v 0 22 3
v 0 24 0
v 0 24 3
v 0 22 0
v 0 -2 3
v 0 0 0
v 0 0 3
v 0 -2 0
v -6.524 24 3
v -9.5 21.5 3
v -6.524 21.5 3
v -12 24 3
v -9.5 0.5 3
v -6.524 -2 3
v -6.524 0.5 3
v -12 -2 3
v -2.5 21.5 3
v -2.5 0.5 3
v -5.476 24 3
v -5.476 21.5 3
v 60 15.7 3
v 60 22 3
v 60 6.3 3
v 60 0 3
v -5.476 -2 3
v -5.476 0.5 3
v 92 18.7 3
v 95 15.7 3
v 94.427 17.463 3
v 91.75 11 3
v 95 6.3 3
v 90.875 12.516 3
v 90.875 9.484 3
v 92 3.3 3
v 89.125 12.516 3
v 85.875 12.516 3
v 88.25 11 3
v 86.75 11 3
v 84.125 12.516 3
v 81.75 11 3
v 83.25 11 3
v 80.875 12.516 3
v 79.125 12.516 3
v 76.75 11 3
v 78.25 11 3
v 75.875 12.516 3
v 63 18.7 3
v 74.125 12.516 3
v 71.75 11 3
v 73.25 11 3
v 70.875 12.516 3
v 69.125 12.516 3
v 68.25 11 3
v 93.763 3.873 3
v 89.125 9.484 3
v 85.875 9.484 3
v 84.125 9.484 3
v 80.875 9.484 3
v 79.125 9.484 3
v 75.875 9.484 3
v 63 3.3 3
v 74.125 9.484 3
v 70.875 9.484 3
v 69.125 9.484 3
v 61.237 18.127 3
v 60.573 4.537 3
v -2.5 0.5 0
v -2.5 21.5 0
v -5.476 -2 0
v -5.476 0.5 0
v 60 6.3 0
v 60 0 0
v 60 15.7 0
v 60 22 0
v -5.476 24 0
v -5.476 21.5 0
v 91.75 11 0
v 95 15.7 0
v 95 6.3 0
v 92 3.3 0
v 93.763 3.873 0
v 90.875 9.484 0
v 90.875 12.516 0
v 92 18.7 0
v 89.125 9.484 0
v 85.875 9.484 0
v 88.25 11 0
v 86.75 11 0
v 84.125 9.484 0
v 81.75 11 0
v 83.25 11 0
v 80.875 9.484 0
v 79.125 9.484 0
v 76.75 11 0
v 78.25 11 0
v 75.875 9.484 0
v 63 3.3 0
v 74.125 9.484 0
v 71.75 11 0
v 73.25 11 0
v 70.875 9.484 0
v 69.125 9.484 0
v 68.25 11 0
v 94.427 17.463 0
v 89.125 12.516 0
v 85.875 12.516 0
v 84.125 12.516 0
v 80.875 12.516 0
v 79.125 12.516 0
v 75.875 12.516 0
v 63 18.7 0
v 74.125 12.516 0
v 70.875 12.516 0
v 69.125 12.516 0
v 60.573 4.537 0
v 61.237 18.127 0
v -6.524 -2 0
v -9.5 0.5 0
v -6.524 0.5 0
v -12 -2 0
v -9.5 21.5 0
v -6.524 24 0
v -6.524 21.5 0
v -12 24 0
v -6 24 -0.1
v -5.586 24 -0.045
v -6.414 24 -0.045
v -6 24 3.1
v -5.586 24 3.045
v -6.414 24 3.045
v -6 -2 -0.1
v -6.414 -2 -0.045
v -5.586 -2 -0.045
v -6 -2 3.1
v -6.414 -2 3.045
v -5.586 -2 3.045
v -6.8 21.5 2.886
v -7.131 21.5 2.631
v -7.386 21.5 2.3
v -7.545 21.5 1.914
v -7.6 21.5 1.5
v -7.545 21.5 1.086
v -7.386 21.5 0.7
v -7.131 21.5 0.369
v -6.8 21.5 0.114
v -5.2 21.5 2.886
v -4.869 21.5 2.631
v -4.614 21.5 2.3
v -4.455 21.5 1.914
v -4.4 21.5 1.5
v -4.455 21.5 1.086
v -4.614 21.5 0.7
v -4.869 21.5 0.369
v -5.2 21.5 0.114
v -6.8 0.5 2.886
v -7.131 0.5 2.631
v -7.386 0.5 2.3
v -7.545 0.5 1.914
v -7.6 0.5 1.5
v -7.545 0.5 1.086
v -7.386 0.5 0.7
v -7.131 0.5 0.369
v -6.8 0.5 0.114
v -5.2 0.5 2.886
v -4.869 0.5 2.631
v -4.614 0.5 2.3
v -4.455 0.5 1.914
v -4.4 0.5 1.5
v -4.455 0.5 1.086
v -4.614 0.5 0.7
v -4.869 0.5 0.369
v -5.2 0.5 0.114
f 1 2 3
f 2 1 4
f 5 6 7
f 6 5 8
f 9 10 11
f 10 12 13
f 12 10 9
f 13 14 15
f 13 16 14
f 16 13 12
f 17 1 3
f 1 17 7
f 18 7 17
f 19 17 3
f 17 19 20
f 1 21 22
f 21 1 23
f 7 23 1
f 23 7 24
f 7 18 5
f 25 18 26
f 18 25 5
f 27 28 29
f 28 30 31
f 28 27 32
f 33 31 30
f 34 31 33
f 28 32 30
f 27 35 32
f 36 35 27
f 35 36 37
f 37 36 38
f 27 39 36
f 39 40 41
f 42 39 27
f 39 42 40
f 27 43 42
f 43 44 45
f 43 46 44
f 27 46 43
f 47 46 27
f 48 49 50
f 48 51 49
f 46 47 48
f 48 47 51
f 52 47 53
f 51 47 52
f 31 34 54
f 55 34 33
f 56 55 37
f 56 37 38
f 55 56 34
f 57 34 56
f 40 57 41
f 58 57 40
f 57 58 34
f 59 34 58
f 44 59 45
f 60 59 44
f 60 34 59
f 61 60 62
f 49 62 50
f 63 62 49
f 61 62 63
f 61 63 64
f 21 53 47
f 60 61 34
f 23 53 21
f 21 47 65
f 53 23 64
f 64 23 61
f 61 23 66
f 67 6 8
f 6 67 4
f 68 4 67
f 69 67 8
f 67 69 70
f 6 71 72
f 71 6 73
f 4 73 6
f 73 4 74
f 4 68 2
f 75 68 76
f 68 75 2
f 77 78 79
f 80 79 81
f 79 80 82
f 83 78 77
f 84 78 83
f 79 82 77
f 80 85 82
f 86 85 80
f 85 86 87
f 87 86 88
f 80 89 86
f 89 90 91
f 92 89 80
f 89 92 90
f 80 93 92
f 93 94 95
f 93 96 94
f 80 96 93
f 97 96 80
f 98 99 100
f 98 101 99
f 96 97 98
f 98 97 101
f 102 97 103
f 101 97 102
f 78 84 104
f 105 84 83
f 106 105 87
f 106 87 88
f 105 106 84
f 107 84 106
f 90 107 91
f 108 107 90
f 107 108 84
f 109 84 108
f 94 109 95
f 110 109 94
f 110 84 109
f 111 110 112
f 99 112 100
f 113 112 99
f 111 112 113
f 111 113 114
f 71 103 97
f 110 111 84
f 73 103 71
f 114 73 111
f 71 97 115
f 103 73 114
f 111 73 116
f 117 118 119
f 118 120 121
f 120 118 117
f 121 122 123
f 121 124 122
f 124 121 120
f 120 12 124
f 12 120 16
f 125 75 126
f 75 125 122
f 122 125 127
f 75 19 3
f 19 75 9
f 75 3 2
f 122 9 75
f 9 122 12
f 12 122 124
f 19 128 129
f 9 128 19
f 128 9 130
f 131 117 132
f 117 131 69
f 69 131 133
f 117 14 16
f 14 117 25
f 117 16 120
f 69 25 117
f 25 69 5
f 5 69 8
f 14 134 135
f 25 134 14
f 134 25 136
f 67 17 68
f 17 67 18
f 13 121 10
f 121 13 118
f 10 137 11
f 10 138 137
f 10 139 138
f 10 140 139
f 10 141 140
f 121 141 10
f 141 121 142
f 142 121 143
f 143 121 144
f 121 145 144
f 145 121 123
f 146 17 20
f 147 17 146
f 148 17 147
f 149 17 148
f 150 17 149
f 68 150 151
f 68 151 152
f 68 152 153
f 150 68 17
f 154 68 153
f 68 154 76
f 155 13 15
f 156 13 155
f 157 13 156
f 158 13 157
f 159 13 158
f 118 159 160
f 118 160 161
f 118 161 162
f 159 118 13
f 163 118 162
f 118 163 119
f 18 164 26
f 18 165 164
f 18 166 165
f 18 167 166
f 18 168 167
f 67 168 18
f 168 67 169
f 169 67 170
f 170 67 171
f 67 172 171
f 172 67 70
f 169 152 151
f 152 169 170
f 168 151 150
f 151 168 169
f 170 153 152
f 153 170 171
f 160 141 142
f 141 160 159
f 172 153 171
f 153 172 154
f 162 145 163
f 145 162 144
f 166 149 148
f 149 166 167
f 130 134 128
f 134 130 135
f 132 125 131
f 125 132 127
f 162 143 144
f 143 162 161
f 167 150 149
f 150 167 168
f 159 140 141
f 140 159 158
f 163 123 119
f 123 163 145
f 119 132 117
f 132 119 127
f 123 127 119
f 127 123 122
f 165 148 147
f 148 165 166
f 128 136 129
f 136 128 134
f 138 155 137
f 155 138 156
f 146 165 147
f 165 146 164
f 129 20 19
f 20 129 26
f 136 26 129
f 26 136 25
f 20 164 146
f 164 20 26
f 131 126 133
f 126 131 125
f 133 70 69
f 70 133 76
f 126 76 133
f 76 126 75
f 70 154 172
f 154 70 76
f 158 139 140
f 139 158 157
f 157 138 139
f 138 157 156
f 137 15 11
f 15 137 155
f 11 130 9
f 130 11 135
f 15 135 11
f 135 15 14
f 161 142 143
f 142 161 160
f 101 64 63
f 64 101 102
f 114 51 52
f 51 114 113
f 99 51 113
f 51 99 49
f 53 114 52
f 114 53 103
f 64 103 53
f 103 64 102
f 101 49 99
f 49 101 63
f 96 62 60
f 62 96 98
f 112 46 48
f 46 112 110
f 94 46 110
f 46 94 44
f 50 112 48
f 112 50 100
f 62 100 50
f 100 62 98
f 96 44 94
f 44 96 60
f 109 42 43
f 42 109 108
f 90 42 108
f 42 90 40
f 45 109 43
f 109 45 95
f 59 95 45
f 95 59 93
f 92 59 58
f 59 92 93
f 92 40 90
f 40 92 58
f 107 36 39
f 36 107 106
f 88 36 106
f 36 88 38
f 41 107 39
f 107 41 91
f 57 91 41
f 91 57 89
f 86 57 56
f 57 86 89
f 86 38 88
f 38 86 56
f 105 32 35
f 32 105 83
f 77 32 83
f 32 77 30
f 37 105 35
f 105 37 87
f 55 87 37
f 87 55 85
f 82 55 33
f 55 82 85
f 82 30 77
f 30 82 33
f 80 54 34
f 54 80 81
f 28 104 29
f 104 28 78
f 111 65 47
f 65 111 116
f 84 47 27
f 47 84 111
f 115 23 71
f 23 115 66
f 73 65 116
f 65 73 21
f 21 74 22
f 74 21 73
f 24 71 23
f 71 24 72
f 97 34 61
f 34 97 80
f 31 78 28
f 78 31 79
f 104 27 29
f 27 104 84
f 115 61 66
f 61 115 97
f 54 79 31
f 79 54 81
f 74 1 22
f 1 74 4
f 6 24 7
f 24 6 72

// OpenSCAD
// latches/buckle.scad — pin-through-hole buckle, leather-bracelet authentic.
// MIT licensed.
//
// One end gets the frame + pin; the other end gets a tongue with a row of
// holes. Caller invokes once at each end with end="left" or end="right".
//
// LEARNING-MODE NOTE: hole count and spacing is a UX call. Defaults below
// give 5 holes at 5 mm spacing => 20 mm of size adjustability. Goth subculture
// tends to want fewer, wider holes; festival use wants more, tighter holes.
// To tune, change BUCKLE_HOLES and BUCKLE_HOLE_SPACING. If you change them,
// also update src/open_studs/params.py to match (drift test will fail
// otherwise once Push 2 lands).

BUCKLE_HOLES         = 5;     // count of adjustment holes
BUCKLE_HOLE_SPACING  = 5;     // mm center-to-center
BUCKLE_HOLE_DIAMETER = 3.5;   // mm — sized to the printed pin
BUCKLE_PIN_DIAMETER  = 3.2;   // mm — slightly under hole for friction
BUCKLE_FRAME_LENGTH  = 12;    // mm — length of the buckle frame
BUCKLE_TONGUE_LENGTH = 35;    // mm — length of the tongue past the band

module latch_buckle(band_width, band_thickness, end = "both") {
    if (end == "left" || end == "both")  buckle_frame(band_width, band_thickness);
    if (end == "right" || end == "both") buckle_tongue(band_width, band_thickness);
}

module buckle_frame(band_width, band_thickness) {
    // a rectangular frame sitting at x=0, extending into -X by BUCKLE_FRAME_LENGTH.
    // pin runs across in Y.
    frame_w = band_width + 4;
    frame_l = BUCKLE_FRAME_LENGTH;
    wall    = 2.5;
    bar_d   = BUCKLE_PIN_DIAMETER;

    translate([-frame_l, -2, 0]) {
        difference() {
            // outer block
            cube([frame_l, frame_w, band_thickness]);
            // inner cutout
            translate([wall, wall, -0.1])
                cube([frame_l - 2 * wall, frame_w - 2 * wall, band_thickness + 0.2]);
        }
        // pin bar across the middle
        translate([frame_l / 2, 0, band_thickness / 2])
            rotate([-90, 0, 0])
                cylinder(h = frame_w, d = bar_d, $fn = 24);
    }
}

module buckle_tongue(band_width, band_thickness) {
    // a tongue at x=0 (right end of band) extending +X by BUCKLE_TONGUE_LENGTH,
    // with BUCKLE_HOLES holes punched through.
    tongue_w = band_width * 0.7;
    tongue_l = BUCKLE_TONGUE_LENGTH;

    difference() {
        translate([0, (band_width - tongue_w) / 2, 0])
            linear_extrude(height = band_thickness)
                offset(r = 3) offset(delta = -3)
                    square([tongue_l, tongue_w]);

        // adjustment holes, centered on the tongue, spaced from the band end
        hole_start = 10;
        for (i = [0 : BUCKLE_HOLES - 1])
            translate([hole_start + i * BUCKLE_HOLE_SPACING, band_width / 2, -0.1])
                cylinder(h = band_thickness + 0.2, d = BUCKLE_HOLE_DIAMETER);
    }
}

// development render — show the frame end on a stub of band so you can see
// how it sits.
*latch_buckle(22, 3, end = "both");
translate([0, 0, 0]) cube([60, 22, 3]);  // visible band stub
latch_buckle(22, 3, end = "left");
translate([60, 0, 0]) latch_buckle(22, 3, end = "right");
